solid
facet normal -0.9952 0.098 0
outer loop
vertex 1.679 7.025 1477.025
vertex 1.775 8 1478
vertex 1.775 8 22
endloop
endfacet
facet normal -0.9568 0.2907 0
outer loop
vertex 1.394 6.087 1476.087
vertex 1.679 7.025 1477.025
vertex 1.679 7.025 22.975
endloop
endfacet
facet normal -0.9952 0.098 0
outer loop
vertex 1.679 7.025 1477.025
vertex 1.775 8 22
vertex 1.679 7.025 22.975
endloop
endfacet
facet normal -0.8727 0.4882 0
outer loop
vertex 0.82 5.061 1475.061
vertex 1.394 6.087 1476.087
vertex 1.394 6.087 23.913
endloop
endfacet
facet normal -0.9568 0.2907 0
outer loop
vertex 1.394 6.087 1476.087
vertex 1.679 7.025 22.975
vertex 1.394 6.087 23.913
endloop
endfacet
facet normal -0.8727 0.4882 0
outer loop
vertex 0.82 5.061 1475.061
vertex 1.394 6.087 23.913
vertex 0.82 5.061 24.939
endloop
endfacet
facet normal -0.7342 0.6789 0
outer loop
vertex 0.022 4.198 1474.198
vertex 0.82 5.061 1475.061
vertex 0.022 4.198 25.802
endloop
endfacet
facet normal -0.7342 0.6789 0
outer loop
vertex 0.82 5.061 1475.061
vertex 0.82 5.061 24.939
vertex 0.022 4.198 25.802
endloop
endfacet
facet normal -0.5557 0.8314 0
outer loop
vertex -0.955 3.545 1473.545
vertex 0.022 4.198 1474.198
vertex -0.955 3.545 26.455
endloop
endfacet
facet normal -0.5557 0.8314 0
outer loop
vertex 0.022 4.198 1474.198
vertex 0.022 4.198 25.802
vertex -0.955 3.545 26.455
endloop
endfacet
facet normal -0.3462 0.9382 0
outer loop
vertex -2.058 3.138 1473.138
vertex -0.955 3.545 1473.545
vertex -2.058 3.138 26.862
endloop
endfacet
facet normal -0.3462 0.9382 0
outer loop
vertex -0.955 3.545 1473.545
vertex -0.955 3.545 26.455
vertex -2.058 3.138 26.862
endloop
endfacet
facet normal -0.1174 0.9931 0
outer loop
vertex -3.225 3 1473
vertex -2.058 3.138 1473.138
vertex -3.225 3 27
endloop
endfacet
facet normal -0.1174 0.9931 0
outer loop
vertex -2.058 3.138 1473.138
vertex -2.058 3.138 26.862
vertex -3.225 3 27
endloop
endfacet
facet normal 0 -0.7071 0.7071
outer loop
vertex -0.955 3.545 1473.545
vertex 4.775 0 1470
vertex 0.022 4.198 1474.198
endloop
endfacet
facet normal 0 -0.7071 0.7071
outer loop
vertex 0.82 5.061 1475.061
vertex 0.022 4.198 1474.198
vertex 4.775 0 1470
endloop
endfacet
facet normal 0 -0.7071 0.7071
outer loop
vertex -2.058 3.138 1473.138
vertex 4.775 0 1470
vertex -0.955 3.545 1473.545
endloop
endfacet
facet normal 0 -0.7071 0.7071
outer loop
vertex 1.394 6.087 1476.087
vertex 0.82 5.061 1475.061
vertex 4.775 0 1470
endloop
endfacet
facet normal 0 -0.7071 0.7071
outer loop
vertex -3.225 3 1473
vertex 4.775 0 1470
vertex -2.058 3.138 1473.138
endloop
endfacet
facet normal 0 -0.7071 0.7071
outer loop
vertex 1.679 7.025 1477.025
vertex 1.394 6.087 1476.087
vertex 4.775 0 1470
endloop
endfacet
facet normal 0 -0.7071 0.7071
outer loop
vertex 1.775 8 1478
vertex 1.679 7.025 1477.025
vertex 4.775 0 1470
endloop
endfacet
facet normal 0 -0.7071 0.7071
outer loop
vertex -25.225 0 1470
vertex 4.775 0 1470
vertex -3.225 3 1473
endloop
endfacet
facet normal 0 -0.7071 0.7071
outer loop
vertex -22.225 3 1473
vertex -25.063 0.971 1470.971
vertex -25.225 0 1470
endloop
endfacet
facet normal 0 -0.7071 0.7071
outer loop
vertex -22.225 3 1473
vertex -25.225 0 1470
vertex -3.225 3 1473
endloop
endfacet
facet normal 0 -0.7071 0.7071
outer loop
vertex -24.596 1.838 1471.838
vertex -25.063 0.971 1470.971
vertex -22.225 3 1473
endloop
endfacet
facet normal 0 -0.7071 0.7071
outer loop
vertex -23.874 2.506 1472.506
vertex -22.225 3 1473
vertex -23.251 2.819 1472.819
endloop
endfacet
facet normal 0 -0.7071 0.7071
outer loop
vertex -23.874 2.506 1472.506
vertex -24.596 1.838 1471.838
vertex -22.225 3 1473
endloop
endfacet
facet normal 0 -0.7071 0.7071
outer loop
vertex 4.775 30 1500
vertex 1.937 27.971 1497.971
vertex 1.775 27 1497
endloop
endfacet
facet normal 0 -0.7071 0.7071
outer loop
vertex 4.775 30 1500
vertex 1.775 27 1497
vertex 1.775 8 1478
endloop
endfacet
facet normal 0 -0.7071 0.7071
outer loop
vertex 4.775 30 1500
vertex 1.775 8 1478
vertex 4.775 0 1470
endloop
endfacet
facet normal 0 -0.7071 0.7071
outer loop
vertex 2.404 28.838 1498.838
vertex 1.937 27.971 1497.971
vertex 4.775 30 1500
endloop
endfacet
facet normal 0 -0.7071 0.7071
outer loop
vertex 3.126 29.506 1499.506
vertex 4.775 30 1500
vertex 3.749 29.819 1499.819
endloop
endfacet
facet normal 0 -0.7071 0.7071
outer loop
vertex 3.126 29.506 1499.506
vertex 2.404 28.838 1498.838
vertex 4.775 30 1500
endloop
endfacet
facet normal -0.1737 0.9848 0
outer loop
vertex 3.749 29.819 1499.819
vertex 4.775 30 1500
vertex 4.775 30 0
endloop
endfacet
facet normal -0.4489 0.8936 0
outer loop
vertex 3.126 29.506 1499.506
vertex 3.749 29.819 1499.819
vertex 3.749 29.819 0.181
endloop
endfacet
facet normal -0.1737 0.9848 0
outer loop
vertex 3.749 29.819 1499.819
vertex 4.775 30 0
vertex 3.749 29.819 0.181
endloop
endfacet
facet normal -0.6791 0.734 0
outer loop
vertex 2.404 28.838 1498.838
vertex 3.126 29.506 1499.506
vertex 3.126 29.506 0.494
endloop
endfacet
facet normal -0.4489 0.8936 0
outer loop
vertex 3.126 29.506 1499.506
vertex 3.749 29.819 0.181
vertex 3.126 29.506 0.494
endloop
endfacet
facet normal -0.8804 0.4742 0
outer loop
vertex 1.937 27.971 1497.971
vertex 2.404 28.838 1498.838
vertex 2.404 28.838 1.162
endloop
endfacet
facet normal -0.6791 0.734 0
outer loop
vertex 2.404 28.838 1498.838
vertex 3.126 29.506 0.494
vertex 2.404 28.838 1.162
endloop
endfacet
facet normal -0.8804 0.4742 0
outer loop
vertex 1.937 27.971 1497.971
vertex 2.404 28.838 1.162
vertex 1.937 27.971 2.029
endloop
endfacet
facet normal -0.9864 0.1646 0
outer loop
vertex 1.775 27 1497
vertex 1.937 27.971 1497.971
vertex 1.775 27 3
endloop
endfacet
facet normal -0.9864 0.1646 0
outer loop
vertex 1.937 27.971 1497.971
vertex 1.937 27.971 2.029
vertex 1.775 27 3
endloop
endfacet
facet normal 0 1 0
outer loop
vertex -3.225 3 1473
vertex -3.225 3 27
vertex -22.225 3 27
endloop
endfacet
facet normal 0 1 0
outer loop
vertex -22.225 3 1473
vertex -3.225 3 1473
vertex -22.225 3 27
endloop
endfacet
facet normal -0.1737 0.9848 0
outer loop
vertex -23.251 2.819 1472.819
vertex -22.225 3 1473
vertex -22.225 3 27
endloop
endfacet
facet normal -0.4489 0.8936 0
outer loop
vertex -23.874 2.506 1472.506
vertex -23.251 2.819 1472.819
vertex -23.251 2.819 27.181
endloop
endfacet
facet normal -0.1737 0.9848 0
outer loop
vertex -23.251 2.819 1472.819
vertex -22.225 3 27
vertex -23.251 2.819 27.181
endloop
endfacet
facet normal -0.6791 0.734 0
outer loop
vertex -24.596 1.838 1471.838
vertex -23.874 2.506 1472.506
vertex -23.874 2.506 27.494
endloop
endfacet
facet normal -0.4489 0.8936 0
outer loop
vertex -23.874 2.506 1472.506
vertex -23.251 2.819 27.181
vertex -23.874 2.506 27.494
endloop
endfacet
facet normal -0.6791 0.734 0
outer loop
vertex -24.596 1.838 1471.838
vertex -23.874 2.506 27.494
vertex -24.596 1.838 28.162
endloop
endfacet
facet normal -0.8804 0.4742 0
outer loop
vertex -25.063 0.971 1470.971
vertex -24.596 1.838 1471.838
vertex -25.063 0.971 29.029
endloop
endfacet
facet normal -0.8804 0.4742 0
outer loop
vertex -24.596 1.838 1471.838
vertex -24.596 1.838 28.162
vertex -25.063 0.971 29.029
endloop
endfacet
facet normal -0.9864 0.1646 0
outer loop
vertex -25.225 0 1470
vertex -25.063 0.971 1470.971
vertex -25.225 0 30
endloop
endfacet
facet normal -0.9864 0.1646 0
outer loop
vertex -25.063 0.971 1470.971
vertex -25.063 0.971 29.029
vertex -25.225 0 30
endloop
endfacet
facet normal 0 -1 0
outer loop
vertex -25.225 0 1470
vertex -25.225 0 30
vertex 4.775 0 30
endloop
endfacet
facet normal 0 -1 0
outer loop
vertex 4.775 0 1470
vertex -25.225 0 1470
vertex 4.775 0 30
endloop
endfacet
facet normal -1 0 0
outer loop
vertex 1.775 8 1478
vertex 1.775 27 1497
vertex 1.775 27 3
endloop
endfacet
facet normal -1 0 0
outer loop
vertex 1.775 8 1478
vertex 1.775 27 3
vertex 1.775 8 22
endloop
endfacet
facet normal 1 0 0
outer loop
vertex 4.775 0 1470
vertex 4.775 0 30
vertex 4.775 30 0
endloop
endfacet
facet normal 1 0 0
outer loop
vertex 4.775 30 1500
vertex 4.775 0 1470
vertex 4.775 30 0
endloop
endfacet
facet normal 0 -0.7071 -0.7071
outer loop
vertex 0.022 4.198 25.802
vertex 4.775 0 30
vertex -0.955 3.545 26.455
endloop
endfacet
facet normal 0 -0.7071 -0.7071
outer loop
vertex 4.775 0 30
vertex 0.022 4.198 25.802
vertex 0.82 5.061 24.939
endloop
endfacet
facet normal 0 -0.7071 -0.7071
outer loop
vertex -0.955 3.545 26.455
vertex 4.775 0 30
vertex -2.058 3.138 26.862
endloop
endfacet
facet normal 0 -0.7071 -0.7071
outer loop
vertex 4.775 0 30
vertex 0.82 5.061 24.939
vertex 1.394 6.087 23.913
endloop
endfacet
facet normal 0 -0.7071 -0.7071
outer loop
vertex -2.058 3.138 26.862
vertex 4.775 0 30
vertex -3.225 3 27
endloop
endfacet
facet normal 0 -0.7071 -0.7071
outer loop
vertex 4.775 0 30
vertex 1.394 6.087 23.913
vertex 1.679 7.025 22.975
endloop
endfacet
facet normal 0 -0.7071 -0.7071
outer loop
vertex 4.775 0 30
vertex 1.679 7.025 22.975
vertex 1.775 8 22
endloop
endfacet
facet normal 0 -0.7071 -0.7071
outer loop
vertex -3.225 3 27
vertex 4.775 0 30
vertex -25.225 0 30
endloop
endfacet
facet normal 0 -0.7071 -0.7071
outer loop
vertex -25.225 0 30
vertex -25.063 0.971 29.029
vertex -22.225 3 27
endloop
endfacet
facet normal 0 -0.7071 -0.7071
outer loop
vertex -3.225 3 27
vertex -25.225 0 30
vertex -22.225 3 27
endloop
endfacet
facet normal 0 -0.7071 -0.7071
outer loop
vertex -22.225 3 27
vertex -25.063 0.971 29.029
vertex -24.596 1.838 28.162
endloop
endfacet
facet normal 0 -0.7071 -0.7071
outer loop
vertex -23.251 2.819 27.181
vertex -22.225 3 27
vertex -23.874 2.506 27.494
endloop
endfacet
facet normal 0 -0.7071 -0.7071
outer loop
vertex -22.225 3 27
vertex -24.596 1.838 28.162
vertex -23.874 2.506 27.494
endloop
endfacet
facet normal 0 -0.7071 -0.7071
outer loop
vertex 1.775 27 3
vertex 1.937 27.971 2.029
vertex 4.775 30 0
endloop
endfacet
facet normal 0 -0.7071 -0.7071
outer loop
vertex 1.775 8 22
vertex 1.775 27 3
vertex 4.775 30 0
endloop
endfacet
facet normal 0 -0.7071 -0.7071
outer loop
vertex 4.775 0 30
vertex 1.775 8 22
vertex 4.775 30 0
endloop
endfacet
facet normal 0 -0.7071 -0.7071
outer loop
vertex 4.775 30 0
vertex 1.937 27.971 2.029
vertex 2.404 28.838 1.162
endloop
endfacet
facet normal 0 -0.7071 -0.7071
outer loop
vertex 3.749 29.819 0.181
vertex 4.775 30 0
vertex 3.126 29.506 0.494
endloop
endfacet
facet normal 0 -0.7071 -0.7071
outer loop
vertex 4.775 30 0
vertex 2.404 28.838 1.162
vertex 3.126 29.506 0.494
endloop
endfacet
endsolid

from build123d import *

# Parameters (mm, degrees)
SALIENTE_EXTRUIR1_DEPTH    = 1500
CORTAR_EXTRUIR1_DEPTH      = 10
CORTAR_EXTRUIR1_DEPTH_BACK = 40


with BuildPart() as part:
    # Croquis3 → Saliente-Extruir1 (new body)
    with BuildSketch(Plane(origin=(0, 0, 0), x_dir=(-1, 0, 0), z_dir=(0, 0, -1))):
        with BuildLine():
            Line((-4.77501925, 0), (-4.77501925, 30))
            ThreePointArc((-4.77501925, 30), (-2.653698906, 29.121320344), (-1.77501925, 27))
            Line((-1.77501925, 27), (-1.77501925, 8))
            ThreePointArc((-1.77501925, 8), (-0.310553156, 4.464466094), (3.22498075, 3))
            Line((3.22498075, 3), (22.22498075, 3))
            ThreePointArc((22.22498075, 3), (24.346301094, 2.121320344), (25.22498075, 0))
            Line((25.22498075, 0), (-4.77501925, 0))
        make_face()
    extrude(amount=-SALIENTE_EXTRUIR1_DEPTH)

    # Croquis4 → Cortar-Extruir1 (cut, two sides: drawn at the far end of the back side and taken through both)
    with BuildSketch(Plane(origin=(0, 0, 0), x_dir=(0, 0, -1), z_dir=(1, 0, 0)).offset(-CORTAR_EXTRUIR1_DEPTH_BACK)):
        Polygon((-1500, 0), (-1470, 0), (-1500, 30), align=None)
        Polygon((0, 0), (-30, 0), (0, 30), align=None)
    extrude(amount=CORTAR_EXTRUIR1_DEPTH + CORTAR_EXTRUIR1_DEPTH_BACK, mode=Mode.SUBTRACT)


solid = part.part
